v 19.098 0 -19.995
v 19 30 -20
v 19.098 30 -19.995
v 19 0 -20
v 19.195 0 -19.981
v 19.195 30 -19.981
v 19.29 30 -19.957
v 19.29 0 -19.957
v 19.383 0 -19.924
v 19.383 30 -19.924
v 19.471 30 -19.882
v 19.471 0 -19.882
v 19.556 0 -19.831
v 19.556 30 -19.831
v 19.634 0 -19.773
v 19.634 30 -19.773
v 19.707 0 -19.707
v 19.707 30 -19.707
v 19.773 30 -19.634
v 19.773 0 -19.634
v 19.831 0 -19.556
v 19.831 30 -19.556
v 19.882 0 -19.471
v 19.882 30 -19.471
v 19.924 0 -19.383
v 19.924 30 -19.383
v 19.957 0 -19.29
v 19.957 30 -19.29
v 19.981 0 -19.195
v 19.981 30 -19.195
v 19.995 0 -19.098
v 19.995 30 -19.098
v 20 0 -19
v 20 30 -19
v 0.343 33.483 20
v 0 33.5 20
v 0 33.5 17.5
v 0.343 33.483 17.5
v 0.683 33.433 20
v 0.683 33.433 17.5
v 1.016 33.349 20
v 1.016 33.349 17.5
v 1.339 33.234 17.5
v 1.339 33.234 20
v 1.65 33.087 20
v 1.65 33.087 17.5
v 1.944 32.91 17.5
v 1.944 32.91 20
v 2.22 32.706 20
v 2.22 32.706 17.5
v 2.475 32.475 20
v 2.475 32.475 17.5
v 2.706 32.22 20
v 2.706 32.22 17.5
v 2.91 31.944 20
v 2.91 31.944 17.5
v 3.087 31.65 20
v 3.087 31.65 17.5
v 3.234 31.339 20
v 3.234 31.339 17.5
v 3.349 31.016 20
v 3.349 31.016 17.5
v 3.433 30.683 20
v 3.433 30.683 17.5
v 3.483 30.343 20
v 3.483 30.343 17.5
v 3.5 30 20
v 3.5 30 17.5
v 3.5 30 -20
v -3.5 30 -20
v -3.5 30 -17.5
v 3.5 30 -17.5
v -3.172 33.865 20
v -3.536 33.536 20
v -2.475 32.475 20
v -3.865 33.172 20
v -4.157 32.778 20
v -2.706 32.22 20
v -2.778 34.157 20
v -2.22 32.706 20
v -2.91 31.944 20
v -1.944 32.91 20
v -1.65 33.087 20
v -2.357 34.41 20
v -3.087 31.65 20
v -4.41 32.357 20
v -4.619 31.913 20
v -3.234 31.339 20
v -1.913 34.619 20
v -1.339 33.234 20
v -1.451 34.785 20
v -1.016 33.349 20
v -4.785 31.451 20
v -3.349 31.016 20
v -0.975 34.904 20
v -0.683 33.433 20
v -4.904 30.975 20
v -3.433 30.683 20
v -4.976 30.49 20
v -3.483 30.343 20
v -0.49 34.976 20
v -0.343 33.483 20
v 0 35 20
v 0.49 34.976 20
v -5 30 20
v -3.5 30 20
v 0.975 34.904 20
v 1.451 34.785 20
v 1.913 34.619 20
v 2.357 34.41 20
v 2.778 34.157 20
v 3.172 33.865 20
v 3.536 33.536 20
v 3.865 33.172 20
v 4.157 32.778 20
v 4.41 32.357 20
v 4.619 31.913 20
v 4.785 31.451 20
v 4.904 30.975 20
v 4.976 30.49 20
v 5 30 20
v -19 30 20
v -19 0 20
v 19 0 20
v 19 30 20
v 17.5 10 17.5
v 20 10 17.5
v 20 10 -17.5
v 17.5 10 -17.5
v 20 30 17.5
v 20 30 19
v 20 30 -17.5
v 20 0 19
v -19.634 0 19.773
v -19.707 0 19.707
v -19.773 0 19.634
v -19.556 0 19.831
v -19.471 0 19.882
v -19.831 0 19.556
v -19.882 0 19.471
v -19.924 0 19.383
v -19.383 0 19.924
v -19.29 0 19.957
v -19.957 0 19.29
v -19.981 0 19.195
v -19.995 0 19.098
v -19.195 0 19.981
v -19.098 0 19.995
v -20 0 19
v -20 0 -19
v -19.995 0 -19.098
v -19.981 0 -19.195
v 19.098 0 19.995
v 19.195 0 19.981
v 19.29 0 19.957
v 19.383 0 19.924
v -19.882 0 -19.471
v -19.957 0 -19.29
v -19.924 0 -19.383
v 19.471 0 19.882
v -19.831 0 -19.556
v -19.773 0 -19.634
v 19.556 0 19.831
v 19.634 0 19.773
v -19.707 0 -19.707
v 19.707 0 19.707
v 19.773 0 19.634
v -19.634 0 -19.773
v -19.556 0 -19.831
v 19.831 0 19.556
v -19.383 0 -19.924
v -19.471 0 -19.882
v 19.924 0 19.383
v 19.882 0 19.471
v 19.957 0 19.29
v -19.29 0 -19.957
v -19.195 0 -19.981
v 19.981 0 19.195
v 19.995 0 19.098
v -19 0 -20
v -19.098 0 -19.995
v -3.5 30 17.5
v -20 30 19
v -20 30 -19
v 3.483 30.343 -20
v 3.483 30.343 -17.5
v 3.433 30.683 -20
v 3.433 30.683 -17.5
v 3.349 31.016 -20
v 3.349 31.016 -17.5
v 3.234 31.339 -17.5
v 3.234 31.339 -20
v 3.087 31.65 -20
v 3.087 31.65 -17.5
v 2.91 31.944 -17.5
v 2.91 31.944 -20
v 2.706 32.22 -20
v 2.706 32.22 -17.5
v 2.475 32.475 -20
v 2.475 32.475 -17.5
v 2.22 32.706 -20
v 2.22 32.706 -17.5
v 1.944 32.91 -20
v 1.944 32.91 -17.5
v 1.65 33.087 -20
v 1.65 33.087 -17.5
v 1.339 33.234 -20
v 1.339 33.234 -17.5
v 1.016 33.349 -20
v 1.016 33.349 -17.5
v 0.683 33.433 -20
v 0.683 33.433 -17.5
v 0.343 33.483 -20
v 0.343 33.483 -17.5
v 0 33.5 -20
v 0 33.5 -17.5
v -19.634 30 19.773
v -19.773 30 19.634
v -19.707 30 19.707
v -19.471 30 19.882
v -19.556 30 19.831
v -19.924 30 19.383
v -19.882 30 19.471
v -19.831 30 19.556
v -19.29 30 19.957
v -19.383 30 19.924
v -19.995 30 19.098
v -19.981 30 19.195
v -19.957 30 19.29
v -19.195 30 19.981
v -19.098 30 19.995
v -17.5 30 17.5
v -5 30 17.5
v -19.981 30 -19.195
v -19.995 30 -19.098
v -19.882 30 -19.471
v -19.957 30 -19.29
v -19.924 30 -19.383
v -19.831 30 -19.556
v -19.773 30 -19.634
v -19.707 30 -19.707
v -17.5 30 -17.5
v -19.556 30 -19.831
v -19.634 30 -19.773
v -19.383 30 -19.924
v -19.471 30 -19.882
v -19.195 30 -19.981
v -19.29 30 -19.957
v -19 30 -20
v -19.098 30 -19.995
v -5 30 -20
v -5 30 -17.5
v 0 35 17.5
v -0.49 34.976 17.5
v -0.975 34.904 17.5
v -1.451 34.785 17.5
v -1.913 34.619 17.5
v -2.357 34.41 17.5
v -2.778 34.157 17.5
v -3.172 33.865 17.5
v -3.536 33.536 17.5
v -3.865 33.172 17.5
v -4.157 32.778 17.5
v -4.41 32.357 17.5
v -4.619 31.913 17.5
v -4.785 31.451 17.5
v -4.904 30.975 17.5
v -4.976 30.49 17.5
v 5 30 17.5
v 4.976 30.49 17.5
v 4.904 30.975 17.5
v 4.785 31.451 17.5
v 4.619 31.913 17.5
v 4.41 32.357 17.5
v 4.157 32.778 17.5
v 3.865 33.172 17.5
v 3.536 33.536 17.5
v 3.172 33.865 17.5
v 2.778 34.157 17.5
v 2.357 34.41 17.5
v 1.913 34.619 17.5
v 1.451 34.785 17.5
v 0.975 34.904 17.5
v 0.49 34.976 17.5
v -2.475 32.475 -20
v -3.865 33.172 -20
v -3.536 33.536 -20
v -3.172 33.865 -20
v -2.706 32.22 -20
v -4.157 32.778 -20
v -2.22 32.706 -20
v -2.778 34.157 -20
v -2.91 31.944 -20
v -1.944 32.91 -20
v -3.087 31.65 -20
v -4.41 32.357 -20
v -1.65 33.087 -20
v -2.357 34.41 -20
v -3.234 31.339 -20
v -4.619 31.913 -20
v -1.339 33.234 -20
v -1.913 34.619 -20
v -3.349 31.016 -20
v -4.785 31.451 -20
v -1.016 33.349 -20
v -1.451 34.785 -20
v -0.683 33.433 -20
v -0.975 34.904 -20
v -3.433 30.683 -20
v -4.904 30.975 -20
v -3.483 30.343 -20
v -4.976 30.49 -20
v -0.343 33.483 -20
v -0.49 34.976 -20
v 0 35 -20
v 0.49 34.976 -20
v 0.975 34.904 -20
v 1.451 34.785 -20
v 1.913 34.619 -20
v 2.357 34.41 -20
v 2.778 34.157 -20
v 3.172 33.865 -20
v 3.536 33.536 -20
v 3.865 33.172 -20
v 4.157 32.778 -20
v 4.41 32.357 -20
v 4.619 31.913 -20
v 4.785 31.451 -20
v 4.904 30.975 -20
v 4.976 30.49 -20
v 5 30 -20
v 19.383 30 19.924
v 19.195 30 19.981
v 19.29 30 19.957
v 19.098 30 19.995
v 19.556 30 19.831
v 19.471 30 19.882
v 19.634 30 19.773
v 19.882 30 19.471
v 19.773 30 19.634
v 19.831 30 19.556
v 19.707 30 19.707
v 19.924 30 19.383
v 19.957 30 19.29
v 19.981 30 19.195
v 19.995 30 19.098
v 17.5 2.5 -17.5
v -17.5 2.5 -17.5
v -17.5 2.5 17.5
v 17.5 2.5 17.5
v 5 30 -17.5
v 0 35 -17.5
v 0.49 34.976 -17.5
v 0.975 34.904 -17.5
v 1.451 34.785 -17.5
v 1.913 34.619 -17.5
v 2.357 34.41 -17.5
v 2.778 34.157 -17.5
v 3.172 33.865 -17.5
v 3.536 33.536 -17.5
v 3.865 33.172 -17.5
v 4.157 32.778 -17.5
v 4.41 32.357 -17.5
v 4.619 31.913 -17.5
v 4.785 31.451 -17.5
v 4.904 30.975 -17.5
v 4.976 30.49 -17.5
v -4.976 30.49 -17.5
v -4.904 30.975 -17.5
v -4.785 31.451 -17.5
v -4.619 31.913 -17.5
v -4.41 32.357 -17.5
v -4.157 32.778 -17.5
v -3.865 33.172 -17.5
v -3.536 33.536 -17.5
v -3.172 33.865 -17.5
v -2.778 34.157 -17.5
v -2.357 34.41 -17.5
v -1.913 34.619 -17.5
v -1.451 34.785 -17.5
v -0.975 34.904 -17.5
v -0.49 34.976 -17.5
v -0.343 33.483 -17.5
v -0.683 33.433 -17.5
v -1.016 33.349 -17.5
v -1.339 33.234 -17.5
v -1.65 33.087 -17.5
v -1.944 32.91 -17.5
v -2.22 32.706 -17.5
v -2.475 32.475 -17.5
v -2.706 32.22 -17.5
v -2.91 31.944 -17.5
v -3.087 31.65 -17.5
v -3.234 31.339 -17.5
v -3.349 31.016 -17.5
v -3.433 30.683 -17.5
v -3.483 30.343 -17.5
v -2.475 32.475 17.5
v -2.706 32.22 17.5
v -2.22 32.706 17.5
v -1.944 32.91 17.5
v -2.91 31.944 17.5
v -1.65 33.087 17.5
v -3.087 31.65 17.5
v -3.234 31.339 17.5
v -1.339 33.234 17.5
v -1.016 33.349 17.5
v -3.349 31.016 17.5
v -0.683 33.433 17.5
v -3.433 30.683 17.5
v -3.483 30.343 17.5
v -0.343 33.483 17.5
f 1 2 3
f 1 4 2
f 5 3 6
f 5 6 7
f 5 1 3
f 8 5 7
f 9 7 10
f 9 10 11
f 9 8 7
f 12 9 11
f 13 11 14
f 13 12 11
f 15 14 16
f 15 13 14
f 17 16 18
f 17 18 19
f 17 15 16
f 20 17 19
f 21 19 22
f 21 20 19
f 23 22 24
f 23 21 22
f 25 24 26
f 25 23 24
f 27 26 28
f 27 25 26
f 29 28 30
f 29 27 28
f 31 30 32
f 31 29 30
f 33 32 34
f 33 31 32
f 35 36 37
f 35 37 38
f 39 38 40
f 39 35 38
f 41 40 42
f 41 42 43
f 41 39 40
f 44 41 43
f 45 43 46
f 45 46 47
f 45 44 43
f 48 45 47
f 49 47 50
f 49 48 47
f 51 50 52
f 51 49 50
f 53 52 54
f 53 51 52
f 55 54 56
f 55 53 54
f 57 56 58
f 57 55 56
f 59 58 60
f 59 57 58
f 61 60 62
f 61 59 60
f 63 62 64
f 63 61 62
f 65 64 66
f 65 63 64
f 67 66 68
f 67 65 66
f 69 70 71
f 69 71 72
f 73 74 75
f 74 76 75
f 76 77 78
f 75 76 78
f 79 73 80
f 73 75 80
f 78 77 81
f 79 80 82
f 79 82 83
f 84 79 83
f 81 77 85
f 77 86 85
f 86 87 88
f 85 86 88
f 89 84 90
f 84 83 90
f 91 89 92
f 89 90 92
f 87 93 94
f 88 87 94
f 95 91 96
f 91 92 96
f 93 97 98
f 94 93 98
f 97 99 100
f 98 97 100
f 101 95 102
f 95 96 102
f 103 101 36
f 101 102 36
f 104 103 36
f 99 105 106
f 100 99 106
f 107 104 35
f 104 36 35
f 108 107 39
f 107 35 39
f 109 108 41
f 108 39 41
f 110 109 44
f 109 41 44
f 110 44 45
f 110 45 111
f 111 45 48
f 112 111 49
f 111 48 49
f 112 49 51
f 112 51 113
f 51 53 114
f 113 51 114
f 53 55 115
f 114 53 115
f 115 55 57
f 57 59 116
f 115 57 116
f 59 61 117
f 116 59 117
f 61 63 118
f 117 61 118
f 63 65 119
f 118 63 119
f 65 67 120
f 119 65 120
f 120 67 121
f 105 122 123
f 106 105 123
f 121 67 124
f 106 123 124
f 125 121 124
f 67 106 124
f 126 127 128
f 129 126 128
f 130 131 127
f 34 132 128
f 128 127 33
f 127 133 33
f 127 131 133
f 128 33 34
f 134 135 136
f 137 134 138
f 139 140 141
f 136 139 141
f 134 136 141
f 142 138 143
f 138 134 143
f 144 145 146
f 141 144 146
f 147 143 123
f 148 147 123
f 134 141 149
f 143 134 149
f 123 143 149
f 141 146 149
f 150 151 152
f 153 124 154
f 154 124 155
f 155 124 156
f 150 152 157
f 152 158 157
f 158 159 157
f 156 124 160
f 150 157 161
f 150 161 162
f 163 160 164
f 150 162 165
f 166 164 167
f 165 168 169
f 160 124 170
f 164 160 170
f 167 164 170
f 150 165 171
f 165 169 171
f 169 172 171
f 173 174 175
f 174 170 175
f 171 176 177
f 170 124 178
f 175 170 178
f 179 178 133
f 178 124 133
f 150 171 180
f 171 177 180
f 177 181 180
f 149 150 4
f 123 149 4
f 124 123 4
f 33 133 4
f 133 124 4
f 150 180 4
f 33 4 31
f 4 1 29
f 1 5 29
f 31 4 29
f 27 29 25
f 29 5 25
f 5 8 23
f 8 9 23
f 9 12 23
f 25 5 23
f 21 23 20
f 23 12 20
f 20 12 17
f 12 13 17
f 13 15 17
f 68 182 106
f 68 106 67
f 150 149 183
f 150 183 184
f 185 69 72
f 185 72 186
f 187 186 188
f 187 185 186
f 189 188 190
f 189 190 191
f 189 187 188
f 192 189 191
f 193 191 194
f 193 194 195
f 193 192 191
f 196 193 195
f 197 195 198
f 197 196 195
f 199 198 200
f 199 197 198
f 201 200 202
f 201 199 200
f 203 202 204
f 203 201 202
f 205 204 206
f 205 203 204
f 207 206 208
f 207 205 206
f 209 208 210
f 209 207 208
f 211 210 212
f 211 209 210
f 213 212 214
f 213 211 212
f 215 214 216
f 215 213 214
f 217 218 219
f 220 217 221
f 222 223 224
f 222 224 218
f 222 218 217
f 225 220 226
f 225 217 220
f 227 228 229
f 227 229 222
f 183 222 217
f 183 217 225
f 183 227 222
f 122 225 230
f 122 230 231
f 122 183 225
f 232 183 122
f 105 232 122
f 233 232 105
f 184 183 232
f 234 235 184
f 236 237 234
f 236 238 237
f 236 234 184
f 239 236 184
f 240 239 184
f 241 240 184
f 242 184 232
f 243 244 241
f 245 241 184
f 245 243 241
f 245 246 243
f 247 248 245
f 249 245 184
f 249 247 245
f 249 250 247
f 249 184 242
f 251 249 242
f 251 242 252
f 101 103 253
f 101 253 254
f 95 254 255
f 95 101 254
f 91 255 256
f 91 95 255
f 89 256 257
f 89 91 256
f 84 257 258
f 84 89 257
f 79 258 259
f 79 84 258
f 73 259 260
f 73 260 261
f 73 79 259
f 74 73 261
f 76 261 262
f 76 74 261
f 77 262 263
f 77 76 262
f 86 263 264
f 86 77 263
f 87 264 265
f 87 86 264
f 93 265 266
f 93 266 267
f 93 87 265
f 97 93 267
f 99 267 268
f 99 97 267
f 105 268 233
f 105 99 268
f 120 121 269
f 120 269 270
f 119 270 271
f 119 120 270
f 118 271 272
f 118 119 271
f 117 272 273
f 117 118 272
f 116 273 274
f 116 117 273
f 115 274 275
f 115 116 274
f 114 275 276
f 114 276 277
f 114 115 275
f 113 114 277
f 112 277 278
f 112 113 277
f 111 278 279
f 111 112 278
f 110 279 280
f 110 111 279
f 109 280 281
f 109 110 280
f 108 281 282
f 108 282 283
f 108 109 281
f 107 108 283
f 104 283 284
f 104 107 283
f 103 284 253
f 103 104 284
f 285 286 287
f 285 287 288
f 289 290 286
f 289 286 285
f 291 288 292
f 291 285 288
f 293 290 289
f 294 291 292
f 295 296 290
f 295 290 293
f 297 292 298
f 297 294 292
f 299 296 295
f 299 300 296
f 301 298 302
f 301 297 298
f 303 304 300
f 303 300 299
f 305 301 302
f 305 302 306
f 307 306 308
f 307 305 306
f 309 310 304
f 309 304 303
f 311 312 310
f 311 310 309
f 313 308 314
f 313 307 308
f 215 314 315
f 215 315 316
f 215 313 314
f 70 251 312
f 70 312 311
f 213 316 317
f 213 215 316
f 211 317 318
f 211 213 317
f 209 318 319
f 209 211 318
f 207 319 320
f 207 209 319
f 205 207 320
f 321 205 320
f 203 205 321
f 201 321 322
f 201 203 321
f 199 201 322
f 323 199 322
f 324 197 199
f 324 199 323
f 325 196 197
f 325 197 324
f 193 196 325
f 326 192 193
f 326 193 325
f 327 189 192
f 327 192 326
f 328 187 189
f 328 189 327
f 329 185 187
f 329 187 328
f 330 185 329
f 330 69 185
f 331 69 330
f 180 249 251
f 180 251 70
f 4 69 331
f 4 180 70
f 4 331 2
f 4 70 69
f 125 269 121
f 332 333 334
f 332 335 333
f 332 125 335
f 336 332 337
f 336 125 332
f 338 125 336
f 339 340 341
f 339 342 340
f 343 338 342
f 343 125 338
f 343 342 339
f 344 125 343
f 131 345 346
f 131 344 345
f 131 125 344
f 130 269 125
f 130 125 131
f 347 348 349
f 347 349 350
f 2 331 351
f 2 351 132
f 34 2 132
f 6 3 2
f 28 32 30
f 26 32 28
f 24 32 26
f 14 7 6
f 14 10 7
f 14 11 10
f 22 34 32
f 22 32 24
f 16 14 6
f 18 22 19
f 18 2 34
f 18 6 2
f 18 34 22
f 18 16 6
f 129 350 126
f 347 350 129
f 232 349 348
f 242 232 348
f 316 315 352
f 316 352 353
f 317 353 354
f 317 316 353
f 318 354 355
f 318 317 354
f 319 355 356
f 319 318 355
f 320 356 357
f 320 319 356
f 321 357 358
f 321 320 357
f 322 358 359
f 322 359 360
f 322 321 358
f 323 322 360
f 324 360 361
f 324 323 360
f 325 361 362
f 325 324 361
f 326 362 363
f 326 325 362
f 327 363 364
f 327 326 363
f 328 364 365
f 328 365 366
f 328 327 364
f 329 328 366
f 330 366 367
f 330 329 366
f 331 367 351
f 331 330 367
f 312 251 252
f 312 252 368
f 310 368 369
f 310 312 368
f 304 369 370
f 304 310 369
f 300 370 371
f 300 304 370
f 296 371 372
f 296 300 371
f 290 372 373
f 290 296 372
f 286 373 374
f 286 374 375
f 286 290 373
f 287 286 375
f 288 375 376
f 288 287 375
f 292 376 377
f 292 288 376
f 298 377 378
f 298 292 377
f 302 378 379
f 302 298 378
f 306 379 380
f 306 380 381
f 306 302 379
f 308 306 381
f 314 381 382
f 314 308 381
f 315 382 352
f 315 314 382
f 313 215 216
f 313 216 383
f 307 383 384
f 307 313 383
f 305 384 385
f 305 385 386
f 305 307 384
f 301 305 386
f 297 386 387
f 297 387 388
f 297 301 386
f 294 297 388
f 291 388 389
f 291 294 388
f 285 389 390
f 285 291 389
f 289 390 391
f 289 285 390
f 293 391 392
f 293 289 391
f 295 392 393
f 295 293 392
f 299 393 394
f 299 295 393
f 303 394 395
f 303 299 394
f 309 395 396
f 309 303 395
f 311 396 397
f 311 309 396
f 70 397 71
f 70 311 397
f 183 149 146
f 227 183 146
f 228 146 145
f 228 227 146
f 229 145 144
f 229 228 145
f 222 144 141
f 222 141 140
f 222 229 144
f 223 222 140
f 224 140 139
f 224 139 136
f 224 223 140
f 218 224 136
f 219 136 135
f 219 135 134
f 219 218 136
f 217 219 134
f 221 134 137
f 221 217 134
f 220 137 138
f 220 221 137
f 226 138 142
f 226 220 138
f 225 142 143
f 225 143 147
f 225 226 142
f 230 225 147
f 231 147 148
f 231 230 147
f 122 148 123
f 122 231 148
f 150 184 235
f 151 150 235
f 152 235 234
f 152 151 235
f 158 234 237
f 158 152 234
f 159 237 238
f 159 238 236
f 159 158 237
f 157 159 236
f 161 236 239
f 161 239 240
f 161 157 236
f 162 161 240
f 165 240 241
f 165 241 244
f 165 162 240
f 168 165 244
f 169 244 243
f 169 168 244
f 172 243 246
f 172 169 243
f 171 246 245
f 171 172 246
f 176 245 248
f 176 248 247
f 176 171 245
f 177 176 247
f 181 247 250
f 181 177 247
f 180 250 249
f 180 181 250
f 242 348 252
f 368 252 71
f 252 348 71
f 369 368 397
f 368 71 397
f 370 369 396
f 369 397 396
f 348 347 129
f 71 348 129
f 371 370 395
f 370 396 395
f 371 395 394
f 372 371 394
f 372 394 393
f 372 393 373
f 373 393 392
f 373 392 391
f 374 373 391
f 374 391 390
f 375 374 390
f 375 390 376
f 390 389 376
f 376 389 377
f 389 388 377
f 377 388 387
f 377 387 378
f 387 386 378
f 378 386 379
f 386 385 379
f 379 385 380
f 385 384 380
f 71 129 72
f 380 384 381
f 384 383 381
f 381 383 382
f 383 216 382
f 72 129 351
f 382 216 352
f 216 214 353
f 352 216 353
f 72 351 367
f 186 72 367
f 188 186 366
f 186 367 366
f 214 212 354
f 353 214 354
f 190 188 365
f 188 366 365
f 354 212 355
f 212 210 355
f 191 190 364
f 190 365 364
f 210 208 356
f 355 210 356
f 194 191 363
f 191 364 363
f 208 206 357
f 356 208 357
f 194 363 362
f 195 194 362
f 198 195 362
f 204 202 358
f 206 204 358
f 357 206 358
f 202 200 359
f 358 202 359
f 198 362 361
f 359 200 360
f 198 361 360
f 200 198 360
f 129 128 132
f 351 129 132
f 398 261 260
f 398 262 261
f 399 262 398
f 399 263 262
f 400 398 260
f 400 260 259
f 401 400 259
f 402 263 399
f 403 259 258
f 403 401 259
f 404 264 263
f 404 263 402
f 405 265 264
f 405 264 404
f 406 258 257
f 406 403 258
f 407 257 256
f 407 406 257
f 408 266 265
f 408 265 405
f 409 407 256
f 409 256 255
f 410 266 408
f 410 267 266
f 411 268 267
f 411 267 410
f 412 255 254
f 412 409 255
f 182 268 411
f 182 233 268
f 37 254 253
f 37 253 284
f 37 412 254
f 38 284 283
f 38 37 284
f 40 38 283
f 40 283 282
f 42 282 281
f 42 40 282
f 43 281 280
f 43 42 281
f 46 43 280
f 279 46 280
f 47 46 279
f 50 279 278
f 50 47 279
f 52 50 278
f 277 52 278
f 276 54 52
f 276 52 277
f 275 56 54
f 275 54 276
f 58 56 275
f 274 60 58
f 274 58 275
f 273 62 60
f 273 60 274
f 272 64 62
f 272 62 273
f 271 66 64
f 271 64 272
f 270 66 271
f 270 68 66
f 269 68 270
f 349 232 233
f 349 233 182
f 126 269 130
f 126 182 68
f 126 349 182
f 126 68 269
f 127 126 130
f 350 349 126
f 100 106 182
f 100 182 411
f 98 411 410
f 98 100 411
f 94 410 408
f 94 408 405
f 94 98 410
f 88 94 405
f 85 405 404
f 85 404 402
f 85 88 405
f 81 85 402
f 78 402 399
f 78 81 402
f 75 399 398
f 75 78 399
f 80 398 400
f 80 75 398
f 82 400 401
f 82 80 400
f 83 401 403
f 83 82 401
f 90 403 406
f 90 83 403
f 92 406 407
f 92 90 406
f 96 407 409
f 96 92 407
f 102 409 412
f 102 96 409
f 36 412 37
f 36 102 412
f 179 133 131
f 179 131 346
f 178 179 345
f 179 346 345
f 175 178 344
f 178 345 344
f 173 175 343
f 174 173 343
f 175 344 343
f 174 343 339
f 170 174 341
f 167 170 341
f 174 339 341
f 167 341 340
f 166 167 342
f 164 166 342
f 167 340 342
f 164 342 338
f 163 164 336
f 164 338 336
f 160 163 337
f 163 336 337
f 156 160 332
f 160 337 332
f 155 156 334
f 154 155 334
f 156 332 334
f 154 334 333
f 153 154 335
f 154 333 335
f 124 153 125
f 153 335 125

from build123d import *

# Parameters (mm, degrees)
SKETCH1_W           = 40
SKETCH1_H           = 40
SKETCH1_W_2         = 35
SKETCH1_H_2         = 35
BOSS_EXTRUDE1_DEPTH = 30
SKETCH2_W           = 40
SKETCH2_H           = 40
BOSS_EXTRUDE2_DEPTH = 2.5
SKETCH3_W           = 35
SKETCH3_H           = 20
CUT_EXTRUDE1_DEPTH  = 2.5
FILLET1_R           = 1
FILLET2_R           = 1
BOSS_EXTRUDE3_DEPTH = 2.5
BOSS_EXTRUDE4_DEPTH = 2.5


with BuildPart() as part:
    # Sketch1 → Boss-Extrude1 (new body)
    with BuildSketch(Plane(origin=(0, 0, 0), x_dir=(1, 0, 0), z_dir=(0, 1, 0))):
        Rectangle(SKETCH1_W, SKETCH1_H)
        Rectangle(SKETCH1_W_2, SKETCH1_H_2, mode=Mode.SUBTRACT)
    extrude(amount=BOSS_EXTRUDE1_DEPTH)

    # Sketch2 → Boss-Extrude2 (add)
    with BuildSketch(Plane(origin=(0, 0, 0), x_dir=(1, 0, 0), z_dir=(0, 1, 0))):
        Rectangle(SKETCH2_W, SKETCH2_H)
    extrude(amount=BOSS_EXTRUDE2_DEPTH)

    # Sketch3 → Cut-Extrude1 (cut)
    with BuildSketch(Plane(origin=(20, 0, 0), x_dir=(0, 0, -1), z_dir=(1, 0, 0))):
        with Locations((0, 20)):
            Rectangle(SKETCH3_W, SKETCH3_H)
    extrude(amount=-CUT_EXTRUDE1_DEPTH, mode=Mode.SUBTRACT)

    # Fillet1
    fillet1_edges = [part.edges().sort_by_distance(p)[0] for p in [
        (20, 15, 20),
        (-20, 15, 20),
    ]]
    fillet(fillet1_edges, radius=FILLET1_R)

    # Fillet2
    fillet2_edges = [part.edges().sort_by_distance(p)[0] for p in [
        (-20, 15, -20),
        (20, 15, -20),
    ]]
    fillet(fillet2_edges, radius=FILLET2_R)

    # Sketch4 → Boss-Extrude3 (add)
    with BuildSketch(Plane.XY.offset(20)):
        with BuildLine():
            ThreePointArc((-3.5, 30), (-2.474873734, 32.474873734), (0, 33.5))
            Line((0, 33.5), (0, 35))
            ThreePointArc((0, 35), (-3.535533906, 33.535533906), (-5, 30))
            Line((-5, 30), (-3.5, 30))
        make_face()
        with BuildLine():
            Line((0, 35), (0, 33.5))
            ThreePointArc((0, 33.5), (2.474873734, 32.474873734), (3.5, 30))
            Line((3.5, 30), (5, 30))
            ThreePointArc((5, 30), (3.535533906, 33.535533906), (0, 35))
        make_face()
    extrude(amount=-BOSS_EXTRUDE3_DEPTH)

    # Sketch5 → Boss-Extrude4 (add)
    with BuildSketch(Plane(origin=(0, 0, -20), x_dir=(-1, 0, 0), z_dir=(0, 0, -1))):
        with BuildLine():
            ThreePointArc((-3.5, 30), (-2.474873734, 32.474873734), (0, 33.5))
            Line((0, 33.5), (0, 35))
            ThreePointArc((0, 35), (-3.535533906, 33.535533906), (-5, 30))
            Line((-5, 30), (-3.5, 30))
        make_face()
        with BuildLine():
            Line((0, 35), (0, 33.5))
            ThreePointArc((0, 33.5), (2.474873734, 32.474873734), (3.5, 30))
            Line((3.5, 30), (5, 30))
            ThreePointArc((5, 30), (3.535533906, 33.535533906), (0, 35))
        make_face()
    extrude(amount=-BOSS_EXTRUDE4_DEPTH)


solid = part.part
